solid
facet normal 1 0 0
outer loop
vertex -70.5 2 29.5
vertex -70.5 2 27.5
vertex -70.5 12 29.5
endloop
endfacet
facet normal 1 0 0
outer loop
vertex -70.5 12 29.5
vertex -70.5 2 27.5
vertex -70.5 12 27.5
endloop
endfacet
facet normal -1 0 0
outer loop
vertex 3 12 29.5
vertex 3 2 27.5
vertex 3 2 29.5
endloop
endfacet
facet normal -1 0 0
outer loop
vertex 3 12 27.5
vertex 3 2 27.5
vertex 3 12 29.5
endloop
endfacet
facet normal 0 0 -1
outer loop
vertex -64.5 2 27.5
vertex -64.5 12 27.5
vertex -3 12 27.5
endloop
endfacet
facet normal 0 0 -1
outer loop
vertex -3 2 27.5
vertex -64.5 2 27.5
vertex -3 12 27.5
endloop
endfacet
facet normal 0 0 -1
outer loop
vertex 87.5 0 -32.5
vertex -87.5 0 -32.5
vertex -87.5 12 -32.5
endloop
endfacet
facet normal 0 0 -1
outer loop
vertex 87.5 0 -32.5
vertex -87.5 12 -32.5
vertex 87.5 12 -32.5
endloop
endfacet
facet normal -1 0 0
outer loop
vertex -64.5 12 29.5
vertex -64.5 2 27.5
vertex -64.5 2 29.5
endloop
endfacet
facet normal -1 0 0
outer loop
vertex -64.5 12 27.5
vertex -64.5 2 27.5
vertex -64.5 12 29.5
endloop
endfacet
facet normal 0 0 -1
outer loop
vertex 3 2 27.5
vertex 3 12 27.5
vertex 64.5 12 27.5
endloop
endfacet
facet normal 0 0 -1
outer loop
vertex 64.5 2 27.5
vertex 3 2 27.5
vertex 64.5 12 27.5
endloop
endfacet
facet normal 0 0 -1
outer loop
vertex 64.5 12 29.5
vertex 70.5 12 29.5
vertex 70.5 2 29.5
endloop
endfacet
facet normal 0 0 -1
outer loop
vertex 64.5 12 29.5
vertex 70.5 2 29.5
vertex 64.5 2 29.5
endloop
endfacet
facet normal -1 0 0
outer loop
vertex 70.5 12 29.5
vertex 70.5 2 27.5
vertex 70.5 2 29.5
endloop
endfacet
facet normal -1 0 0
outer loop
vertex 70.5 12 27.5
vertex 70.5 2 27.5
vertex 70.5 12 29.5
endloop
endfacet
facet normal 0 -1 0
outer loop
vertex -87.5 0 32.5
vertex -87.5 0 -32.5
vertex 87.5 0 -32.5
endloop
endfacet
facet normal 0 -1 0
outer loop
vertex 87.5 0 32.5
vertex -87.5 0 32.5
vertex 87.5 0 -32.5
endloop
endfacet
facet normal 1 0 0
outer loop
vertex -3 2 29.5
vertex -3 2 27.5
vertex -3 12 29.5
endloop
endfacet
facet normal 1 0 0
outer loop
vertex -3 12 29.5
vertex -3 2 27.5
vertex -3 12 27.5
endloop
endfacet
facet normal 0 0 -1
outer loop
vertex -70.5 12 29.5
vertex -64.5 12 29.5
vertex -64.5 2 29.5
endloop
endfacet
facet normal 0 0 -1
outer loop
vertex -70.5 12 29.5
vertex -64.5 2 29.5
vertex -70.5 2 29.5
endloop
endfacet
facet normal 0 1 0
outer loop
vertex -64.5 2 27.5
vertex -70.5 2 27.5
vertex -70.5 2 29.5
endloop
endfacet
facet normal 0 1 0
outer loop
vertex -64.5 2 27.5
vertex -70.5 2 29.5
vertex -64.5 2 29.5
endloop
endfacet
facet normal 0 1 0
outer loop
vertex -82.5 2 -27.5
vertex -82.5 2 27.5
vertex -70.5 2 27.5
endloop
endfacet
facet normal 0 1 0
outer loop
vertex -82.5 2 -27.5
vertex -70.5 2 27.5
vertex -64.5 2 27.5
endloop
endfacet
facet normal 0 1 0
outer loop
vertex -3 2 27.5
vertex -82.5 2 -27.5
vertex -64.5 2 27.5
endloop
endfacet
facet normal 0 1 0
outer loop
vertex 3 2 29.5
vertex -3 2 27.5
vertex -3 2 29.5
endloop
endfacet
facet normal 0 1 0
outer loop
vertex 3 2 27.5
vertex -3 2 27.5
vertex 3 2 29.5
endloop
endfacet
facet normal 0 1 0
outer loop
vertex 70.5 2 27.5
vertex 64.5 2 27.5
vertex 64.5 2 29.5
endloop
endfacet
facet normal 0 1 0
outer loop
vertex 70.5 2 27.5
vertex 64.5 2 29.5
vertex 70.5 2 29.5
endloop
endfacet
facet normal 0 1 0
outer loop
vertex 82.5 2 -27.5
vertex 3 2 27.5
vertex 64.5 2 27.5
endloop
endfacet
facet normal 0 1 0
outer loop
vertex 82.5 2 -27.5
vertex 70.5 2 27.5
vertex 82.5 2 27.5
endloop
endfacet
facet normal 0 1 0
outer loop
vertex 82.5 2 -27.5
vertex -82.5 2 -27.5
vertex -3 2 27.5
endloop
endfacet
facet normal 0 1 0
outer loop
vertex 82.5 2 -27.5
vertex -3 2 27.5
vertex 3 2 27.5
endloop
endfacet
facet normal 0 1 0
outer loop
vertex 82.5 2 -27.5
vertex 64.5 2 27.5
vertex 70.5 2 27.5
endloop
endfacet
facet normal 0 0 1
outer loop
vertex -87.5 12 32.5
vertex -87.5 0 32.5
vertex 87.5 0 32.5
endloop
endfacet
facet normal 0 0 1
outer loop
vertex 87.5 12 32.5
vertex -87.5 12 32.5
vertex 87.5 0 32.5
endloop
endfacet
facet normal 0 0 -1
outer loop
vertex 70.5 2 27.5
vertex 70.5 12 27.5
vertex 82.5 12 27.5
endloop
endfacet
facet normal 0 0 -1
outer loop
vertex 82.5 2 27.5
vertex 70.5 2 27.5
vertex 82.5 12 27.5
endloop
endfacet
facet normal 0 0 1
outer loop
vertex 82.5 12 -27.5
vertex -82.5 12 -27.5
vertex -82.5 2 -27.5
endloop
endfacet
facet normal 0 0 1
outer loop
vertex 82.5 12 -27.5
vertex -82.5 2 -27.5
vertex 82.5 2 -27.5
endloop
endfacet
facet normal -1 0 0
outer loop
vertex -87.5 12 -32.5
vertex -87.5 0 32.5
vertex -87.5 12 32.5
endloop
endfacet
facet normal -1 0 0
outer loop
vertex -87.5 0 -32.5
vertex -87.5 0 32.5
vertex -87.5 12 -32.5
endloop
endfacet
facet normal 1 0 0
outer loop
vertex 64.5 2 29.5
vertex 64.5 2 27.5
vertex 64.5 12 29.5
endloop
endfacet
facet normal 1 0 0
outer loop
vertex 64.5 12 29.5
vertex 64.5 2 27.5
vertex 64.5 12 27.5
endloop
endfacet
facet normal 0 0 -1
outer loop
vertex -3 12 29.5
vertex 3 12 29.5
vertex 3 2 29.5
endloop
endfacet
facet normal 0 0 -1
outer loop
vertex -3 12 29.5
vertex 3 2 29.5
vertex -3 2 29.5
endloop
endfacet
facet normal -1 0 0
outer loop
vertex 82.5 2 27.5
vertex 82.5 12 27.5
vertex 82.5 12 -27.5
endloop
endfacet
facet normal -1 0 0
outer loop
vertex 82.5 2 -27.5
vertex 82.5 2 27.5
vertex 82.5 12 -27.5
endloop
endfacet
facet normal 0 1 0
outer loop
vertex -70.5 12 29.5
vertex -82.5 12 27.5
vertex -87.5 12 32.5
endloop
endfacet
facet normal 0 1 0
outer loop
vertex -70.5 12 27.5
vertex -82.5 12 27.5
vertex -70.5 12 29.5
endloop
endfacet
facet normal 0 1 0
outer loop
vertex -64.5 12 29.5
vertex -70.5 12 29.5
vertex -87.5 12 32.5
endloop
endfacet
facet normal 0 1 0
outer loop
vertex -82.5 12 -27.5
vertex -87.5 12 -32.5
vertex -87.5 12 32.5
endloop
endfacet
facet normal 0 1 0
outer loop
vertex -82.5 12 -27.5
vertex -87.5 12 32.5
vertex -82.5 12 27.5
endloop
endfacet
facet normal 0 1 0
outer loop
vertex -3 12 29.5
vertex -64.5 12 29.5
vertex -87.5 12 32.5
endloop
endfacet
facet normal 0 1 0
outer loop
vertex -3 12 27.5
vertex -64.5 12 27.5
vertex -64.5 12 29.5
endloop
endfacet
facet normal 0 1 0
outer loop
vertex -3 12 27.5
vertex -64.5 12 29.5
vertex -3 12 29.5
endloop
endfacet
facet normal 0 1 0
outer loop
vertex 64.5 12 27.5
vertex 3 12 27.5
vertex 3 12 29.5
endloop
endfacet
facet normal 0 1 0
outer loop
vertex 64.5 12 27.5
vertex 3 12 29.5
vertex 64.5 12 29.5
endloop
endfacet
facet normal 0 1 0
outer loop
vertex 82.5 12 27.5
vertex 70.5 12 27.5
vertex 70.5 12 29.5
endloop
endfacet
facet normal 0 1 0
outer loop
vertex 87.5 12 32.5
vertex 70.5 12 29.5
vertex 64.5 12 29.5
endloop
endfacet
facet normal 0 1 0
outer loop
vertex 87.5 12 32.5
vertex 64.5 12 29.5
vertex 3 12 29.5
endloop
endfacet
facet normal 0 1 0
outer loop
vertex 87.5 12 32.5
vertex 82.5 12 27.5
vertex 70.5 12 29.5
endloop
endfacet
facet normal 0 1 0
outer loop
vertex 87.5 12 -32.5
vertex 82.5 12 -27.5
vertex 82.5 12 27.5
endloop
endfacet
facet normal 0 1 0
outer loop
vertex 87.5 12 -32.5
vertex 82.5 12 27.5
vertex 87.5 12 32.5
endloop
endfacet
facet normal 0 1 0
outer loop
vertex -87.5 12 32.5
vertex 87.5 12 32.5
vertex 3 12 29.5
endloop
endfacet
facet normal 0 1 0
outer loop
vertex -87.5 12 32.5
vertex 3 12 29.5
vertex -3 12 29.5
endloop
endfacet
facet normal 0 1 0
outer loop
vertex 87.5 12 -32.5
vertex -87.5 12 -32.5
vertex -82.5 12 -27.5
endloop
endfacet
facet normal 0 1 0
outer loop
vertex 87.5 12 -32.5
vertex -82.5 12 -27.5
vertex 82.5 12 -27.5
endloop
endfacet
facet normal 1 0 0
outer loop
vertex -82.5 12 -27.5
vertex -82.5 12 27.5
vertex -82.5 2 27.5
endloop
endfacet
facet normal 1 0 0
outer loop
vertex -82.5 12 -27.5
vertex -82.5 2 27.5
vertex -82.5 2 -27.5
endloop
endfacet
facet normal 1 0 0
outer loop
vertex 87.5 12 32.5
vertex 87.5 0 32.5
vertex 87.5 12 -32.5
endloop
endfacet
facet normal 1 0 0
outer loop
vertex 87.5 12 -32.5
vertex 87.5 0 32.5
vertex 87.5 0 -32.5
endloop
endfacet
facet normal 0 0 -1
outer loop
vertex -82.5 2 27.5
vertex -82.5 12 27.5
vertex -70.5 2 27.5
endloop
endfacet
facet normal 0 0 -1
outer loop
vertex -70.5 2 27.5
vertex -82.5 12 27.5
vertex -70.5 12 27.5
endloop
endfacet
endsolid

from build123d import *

# Parameters (mm, degrees)
SKETCH1_W           = 175
SKETCH1_H           = 65
BOSS_EXTRUDE1_DEPTH = 12
SKETCH2_W           = 165
SKETCH2_H           = 55
CUT_EXTRUDE1_DEPTH  = 10
SKETCH5_W           = 6
SKETCH5_H           = 10
CUT_EXTRUDE2_DEPTH  = 2
SKETCH6_W           = 6
SKETCH6_H           = 10
CUT_EXTRUDE3_DEPTH  = 2
SKETCH7_W           = 6
SKETCH7_H           = 10
CUT_EXTRUDE4_DEPTH  = 2


with BuildPart() as part:
    # Sketch1 → Boss-Extrude1 (new body)
    with BuildSketch(Plane(origin=(0, 0, 0), x_dir=(1, 0, 0), z_dir=(0, 1, 0))):
        Rectangle(SKETCH1_W, SKETCH1_H)
    extrude(amount=BOSS_EXTRUDE1_DEPTH)

    # Sketch2 → Cut-Extrude1 (cut)
    with BuildSketch(Plane(origin=(0, 12, 0), x_dir=(1, 0, 0), z_dir=(0, 1, 0))):
        Rectangle(SKETCH2_W, SKETCH2_H)
    extrude(amount=-CUT_EXTRUDE1_DEPTH, mode=Mode.SUBTRACT)

    # Sketch5 → Cut-Extrude2 (cut)
    with BuildSketch(Plane(origin=(0, 0, 27.5), x_dir=(-1, 0, 0), z_dir=(0, 0, -1))):
        with Locations((0, 7)):
            Rectangle(SKETCH5_W, SKETCH5_H)
    extrude(amount=-CUT_EXTRUDE2_DEPTH, mode=Mode.SUBTRACT)

    # Sketch6 → Cut-Extrude3 (cut)
    with BuildSketch(Plane(origin=(0, 0, 27.5), x_dir=(-1, 0, 0), z_dir=(0, 0, -1))):
        with Locations((-67.5, 7)):
            Rectangle(SKETCH6_W, SKETCH6_H)
    extrude(amount=-CUT_EXTRUDE3_DEPTH, mode=Mode.SUBTRACT)

    # Sketch7 → Cut-Extrude4 (cut)
    with BuildSketch(Plane(origin=(0, 0, 27.5), x_dir=(-1, 0, 0), z_dir=(0, 0, -1))):
        with Locations((67.5, 7)):
            Rectangle(SKETCH7_W, SKETCH7_H)
    extrude(amount=-CUT_EXTRUDE4_DEPTH, mode=Mode.SUBTRACT)


solid = part.part
